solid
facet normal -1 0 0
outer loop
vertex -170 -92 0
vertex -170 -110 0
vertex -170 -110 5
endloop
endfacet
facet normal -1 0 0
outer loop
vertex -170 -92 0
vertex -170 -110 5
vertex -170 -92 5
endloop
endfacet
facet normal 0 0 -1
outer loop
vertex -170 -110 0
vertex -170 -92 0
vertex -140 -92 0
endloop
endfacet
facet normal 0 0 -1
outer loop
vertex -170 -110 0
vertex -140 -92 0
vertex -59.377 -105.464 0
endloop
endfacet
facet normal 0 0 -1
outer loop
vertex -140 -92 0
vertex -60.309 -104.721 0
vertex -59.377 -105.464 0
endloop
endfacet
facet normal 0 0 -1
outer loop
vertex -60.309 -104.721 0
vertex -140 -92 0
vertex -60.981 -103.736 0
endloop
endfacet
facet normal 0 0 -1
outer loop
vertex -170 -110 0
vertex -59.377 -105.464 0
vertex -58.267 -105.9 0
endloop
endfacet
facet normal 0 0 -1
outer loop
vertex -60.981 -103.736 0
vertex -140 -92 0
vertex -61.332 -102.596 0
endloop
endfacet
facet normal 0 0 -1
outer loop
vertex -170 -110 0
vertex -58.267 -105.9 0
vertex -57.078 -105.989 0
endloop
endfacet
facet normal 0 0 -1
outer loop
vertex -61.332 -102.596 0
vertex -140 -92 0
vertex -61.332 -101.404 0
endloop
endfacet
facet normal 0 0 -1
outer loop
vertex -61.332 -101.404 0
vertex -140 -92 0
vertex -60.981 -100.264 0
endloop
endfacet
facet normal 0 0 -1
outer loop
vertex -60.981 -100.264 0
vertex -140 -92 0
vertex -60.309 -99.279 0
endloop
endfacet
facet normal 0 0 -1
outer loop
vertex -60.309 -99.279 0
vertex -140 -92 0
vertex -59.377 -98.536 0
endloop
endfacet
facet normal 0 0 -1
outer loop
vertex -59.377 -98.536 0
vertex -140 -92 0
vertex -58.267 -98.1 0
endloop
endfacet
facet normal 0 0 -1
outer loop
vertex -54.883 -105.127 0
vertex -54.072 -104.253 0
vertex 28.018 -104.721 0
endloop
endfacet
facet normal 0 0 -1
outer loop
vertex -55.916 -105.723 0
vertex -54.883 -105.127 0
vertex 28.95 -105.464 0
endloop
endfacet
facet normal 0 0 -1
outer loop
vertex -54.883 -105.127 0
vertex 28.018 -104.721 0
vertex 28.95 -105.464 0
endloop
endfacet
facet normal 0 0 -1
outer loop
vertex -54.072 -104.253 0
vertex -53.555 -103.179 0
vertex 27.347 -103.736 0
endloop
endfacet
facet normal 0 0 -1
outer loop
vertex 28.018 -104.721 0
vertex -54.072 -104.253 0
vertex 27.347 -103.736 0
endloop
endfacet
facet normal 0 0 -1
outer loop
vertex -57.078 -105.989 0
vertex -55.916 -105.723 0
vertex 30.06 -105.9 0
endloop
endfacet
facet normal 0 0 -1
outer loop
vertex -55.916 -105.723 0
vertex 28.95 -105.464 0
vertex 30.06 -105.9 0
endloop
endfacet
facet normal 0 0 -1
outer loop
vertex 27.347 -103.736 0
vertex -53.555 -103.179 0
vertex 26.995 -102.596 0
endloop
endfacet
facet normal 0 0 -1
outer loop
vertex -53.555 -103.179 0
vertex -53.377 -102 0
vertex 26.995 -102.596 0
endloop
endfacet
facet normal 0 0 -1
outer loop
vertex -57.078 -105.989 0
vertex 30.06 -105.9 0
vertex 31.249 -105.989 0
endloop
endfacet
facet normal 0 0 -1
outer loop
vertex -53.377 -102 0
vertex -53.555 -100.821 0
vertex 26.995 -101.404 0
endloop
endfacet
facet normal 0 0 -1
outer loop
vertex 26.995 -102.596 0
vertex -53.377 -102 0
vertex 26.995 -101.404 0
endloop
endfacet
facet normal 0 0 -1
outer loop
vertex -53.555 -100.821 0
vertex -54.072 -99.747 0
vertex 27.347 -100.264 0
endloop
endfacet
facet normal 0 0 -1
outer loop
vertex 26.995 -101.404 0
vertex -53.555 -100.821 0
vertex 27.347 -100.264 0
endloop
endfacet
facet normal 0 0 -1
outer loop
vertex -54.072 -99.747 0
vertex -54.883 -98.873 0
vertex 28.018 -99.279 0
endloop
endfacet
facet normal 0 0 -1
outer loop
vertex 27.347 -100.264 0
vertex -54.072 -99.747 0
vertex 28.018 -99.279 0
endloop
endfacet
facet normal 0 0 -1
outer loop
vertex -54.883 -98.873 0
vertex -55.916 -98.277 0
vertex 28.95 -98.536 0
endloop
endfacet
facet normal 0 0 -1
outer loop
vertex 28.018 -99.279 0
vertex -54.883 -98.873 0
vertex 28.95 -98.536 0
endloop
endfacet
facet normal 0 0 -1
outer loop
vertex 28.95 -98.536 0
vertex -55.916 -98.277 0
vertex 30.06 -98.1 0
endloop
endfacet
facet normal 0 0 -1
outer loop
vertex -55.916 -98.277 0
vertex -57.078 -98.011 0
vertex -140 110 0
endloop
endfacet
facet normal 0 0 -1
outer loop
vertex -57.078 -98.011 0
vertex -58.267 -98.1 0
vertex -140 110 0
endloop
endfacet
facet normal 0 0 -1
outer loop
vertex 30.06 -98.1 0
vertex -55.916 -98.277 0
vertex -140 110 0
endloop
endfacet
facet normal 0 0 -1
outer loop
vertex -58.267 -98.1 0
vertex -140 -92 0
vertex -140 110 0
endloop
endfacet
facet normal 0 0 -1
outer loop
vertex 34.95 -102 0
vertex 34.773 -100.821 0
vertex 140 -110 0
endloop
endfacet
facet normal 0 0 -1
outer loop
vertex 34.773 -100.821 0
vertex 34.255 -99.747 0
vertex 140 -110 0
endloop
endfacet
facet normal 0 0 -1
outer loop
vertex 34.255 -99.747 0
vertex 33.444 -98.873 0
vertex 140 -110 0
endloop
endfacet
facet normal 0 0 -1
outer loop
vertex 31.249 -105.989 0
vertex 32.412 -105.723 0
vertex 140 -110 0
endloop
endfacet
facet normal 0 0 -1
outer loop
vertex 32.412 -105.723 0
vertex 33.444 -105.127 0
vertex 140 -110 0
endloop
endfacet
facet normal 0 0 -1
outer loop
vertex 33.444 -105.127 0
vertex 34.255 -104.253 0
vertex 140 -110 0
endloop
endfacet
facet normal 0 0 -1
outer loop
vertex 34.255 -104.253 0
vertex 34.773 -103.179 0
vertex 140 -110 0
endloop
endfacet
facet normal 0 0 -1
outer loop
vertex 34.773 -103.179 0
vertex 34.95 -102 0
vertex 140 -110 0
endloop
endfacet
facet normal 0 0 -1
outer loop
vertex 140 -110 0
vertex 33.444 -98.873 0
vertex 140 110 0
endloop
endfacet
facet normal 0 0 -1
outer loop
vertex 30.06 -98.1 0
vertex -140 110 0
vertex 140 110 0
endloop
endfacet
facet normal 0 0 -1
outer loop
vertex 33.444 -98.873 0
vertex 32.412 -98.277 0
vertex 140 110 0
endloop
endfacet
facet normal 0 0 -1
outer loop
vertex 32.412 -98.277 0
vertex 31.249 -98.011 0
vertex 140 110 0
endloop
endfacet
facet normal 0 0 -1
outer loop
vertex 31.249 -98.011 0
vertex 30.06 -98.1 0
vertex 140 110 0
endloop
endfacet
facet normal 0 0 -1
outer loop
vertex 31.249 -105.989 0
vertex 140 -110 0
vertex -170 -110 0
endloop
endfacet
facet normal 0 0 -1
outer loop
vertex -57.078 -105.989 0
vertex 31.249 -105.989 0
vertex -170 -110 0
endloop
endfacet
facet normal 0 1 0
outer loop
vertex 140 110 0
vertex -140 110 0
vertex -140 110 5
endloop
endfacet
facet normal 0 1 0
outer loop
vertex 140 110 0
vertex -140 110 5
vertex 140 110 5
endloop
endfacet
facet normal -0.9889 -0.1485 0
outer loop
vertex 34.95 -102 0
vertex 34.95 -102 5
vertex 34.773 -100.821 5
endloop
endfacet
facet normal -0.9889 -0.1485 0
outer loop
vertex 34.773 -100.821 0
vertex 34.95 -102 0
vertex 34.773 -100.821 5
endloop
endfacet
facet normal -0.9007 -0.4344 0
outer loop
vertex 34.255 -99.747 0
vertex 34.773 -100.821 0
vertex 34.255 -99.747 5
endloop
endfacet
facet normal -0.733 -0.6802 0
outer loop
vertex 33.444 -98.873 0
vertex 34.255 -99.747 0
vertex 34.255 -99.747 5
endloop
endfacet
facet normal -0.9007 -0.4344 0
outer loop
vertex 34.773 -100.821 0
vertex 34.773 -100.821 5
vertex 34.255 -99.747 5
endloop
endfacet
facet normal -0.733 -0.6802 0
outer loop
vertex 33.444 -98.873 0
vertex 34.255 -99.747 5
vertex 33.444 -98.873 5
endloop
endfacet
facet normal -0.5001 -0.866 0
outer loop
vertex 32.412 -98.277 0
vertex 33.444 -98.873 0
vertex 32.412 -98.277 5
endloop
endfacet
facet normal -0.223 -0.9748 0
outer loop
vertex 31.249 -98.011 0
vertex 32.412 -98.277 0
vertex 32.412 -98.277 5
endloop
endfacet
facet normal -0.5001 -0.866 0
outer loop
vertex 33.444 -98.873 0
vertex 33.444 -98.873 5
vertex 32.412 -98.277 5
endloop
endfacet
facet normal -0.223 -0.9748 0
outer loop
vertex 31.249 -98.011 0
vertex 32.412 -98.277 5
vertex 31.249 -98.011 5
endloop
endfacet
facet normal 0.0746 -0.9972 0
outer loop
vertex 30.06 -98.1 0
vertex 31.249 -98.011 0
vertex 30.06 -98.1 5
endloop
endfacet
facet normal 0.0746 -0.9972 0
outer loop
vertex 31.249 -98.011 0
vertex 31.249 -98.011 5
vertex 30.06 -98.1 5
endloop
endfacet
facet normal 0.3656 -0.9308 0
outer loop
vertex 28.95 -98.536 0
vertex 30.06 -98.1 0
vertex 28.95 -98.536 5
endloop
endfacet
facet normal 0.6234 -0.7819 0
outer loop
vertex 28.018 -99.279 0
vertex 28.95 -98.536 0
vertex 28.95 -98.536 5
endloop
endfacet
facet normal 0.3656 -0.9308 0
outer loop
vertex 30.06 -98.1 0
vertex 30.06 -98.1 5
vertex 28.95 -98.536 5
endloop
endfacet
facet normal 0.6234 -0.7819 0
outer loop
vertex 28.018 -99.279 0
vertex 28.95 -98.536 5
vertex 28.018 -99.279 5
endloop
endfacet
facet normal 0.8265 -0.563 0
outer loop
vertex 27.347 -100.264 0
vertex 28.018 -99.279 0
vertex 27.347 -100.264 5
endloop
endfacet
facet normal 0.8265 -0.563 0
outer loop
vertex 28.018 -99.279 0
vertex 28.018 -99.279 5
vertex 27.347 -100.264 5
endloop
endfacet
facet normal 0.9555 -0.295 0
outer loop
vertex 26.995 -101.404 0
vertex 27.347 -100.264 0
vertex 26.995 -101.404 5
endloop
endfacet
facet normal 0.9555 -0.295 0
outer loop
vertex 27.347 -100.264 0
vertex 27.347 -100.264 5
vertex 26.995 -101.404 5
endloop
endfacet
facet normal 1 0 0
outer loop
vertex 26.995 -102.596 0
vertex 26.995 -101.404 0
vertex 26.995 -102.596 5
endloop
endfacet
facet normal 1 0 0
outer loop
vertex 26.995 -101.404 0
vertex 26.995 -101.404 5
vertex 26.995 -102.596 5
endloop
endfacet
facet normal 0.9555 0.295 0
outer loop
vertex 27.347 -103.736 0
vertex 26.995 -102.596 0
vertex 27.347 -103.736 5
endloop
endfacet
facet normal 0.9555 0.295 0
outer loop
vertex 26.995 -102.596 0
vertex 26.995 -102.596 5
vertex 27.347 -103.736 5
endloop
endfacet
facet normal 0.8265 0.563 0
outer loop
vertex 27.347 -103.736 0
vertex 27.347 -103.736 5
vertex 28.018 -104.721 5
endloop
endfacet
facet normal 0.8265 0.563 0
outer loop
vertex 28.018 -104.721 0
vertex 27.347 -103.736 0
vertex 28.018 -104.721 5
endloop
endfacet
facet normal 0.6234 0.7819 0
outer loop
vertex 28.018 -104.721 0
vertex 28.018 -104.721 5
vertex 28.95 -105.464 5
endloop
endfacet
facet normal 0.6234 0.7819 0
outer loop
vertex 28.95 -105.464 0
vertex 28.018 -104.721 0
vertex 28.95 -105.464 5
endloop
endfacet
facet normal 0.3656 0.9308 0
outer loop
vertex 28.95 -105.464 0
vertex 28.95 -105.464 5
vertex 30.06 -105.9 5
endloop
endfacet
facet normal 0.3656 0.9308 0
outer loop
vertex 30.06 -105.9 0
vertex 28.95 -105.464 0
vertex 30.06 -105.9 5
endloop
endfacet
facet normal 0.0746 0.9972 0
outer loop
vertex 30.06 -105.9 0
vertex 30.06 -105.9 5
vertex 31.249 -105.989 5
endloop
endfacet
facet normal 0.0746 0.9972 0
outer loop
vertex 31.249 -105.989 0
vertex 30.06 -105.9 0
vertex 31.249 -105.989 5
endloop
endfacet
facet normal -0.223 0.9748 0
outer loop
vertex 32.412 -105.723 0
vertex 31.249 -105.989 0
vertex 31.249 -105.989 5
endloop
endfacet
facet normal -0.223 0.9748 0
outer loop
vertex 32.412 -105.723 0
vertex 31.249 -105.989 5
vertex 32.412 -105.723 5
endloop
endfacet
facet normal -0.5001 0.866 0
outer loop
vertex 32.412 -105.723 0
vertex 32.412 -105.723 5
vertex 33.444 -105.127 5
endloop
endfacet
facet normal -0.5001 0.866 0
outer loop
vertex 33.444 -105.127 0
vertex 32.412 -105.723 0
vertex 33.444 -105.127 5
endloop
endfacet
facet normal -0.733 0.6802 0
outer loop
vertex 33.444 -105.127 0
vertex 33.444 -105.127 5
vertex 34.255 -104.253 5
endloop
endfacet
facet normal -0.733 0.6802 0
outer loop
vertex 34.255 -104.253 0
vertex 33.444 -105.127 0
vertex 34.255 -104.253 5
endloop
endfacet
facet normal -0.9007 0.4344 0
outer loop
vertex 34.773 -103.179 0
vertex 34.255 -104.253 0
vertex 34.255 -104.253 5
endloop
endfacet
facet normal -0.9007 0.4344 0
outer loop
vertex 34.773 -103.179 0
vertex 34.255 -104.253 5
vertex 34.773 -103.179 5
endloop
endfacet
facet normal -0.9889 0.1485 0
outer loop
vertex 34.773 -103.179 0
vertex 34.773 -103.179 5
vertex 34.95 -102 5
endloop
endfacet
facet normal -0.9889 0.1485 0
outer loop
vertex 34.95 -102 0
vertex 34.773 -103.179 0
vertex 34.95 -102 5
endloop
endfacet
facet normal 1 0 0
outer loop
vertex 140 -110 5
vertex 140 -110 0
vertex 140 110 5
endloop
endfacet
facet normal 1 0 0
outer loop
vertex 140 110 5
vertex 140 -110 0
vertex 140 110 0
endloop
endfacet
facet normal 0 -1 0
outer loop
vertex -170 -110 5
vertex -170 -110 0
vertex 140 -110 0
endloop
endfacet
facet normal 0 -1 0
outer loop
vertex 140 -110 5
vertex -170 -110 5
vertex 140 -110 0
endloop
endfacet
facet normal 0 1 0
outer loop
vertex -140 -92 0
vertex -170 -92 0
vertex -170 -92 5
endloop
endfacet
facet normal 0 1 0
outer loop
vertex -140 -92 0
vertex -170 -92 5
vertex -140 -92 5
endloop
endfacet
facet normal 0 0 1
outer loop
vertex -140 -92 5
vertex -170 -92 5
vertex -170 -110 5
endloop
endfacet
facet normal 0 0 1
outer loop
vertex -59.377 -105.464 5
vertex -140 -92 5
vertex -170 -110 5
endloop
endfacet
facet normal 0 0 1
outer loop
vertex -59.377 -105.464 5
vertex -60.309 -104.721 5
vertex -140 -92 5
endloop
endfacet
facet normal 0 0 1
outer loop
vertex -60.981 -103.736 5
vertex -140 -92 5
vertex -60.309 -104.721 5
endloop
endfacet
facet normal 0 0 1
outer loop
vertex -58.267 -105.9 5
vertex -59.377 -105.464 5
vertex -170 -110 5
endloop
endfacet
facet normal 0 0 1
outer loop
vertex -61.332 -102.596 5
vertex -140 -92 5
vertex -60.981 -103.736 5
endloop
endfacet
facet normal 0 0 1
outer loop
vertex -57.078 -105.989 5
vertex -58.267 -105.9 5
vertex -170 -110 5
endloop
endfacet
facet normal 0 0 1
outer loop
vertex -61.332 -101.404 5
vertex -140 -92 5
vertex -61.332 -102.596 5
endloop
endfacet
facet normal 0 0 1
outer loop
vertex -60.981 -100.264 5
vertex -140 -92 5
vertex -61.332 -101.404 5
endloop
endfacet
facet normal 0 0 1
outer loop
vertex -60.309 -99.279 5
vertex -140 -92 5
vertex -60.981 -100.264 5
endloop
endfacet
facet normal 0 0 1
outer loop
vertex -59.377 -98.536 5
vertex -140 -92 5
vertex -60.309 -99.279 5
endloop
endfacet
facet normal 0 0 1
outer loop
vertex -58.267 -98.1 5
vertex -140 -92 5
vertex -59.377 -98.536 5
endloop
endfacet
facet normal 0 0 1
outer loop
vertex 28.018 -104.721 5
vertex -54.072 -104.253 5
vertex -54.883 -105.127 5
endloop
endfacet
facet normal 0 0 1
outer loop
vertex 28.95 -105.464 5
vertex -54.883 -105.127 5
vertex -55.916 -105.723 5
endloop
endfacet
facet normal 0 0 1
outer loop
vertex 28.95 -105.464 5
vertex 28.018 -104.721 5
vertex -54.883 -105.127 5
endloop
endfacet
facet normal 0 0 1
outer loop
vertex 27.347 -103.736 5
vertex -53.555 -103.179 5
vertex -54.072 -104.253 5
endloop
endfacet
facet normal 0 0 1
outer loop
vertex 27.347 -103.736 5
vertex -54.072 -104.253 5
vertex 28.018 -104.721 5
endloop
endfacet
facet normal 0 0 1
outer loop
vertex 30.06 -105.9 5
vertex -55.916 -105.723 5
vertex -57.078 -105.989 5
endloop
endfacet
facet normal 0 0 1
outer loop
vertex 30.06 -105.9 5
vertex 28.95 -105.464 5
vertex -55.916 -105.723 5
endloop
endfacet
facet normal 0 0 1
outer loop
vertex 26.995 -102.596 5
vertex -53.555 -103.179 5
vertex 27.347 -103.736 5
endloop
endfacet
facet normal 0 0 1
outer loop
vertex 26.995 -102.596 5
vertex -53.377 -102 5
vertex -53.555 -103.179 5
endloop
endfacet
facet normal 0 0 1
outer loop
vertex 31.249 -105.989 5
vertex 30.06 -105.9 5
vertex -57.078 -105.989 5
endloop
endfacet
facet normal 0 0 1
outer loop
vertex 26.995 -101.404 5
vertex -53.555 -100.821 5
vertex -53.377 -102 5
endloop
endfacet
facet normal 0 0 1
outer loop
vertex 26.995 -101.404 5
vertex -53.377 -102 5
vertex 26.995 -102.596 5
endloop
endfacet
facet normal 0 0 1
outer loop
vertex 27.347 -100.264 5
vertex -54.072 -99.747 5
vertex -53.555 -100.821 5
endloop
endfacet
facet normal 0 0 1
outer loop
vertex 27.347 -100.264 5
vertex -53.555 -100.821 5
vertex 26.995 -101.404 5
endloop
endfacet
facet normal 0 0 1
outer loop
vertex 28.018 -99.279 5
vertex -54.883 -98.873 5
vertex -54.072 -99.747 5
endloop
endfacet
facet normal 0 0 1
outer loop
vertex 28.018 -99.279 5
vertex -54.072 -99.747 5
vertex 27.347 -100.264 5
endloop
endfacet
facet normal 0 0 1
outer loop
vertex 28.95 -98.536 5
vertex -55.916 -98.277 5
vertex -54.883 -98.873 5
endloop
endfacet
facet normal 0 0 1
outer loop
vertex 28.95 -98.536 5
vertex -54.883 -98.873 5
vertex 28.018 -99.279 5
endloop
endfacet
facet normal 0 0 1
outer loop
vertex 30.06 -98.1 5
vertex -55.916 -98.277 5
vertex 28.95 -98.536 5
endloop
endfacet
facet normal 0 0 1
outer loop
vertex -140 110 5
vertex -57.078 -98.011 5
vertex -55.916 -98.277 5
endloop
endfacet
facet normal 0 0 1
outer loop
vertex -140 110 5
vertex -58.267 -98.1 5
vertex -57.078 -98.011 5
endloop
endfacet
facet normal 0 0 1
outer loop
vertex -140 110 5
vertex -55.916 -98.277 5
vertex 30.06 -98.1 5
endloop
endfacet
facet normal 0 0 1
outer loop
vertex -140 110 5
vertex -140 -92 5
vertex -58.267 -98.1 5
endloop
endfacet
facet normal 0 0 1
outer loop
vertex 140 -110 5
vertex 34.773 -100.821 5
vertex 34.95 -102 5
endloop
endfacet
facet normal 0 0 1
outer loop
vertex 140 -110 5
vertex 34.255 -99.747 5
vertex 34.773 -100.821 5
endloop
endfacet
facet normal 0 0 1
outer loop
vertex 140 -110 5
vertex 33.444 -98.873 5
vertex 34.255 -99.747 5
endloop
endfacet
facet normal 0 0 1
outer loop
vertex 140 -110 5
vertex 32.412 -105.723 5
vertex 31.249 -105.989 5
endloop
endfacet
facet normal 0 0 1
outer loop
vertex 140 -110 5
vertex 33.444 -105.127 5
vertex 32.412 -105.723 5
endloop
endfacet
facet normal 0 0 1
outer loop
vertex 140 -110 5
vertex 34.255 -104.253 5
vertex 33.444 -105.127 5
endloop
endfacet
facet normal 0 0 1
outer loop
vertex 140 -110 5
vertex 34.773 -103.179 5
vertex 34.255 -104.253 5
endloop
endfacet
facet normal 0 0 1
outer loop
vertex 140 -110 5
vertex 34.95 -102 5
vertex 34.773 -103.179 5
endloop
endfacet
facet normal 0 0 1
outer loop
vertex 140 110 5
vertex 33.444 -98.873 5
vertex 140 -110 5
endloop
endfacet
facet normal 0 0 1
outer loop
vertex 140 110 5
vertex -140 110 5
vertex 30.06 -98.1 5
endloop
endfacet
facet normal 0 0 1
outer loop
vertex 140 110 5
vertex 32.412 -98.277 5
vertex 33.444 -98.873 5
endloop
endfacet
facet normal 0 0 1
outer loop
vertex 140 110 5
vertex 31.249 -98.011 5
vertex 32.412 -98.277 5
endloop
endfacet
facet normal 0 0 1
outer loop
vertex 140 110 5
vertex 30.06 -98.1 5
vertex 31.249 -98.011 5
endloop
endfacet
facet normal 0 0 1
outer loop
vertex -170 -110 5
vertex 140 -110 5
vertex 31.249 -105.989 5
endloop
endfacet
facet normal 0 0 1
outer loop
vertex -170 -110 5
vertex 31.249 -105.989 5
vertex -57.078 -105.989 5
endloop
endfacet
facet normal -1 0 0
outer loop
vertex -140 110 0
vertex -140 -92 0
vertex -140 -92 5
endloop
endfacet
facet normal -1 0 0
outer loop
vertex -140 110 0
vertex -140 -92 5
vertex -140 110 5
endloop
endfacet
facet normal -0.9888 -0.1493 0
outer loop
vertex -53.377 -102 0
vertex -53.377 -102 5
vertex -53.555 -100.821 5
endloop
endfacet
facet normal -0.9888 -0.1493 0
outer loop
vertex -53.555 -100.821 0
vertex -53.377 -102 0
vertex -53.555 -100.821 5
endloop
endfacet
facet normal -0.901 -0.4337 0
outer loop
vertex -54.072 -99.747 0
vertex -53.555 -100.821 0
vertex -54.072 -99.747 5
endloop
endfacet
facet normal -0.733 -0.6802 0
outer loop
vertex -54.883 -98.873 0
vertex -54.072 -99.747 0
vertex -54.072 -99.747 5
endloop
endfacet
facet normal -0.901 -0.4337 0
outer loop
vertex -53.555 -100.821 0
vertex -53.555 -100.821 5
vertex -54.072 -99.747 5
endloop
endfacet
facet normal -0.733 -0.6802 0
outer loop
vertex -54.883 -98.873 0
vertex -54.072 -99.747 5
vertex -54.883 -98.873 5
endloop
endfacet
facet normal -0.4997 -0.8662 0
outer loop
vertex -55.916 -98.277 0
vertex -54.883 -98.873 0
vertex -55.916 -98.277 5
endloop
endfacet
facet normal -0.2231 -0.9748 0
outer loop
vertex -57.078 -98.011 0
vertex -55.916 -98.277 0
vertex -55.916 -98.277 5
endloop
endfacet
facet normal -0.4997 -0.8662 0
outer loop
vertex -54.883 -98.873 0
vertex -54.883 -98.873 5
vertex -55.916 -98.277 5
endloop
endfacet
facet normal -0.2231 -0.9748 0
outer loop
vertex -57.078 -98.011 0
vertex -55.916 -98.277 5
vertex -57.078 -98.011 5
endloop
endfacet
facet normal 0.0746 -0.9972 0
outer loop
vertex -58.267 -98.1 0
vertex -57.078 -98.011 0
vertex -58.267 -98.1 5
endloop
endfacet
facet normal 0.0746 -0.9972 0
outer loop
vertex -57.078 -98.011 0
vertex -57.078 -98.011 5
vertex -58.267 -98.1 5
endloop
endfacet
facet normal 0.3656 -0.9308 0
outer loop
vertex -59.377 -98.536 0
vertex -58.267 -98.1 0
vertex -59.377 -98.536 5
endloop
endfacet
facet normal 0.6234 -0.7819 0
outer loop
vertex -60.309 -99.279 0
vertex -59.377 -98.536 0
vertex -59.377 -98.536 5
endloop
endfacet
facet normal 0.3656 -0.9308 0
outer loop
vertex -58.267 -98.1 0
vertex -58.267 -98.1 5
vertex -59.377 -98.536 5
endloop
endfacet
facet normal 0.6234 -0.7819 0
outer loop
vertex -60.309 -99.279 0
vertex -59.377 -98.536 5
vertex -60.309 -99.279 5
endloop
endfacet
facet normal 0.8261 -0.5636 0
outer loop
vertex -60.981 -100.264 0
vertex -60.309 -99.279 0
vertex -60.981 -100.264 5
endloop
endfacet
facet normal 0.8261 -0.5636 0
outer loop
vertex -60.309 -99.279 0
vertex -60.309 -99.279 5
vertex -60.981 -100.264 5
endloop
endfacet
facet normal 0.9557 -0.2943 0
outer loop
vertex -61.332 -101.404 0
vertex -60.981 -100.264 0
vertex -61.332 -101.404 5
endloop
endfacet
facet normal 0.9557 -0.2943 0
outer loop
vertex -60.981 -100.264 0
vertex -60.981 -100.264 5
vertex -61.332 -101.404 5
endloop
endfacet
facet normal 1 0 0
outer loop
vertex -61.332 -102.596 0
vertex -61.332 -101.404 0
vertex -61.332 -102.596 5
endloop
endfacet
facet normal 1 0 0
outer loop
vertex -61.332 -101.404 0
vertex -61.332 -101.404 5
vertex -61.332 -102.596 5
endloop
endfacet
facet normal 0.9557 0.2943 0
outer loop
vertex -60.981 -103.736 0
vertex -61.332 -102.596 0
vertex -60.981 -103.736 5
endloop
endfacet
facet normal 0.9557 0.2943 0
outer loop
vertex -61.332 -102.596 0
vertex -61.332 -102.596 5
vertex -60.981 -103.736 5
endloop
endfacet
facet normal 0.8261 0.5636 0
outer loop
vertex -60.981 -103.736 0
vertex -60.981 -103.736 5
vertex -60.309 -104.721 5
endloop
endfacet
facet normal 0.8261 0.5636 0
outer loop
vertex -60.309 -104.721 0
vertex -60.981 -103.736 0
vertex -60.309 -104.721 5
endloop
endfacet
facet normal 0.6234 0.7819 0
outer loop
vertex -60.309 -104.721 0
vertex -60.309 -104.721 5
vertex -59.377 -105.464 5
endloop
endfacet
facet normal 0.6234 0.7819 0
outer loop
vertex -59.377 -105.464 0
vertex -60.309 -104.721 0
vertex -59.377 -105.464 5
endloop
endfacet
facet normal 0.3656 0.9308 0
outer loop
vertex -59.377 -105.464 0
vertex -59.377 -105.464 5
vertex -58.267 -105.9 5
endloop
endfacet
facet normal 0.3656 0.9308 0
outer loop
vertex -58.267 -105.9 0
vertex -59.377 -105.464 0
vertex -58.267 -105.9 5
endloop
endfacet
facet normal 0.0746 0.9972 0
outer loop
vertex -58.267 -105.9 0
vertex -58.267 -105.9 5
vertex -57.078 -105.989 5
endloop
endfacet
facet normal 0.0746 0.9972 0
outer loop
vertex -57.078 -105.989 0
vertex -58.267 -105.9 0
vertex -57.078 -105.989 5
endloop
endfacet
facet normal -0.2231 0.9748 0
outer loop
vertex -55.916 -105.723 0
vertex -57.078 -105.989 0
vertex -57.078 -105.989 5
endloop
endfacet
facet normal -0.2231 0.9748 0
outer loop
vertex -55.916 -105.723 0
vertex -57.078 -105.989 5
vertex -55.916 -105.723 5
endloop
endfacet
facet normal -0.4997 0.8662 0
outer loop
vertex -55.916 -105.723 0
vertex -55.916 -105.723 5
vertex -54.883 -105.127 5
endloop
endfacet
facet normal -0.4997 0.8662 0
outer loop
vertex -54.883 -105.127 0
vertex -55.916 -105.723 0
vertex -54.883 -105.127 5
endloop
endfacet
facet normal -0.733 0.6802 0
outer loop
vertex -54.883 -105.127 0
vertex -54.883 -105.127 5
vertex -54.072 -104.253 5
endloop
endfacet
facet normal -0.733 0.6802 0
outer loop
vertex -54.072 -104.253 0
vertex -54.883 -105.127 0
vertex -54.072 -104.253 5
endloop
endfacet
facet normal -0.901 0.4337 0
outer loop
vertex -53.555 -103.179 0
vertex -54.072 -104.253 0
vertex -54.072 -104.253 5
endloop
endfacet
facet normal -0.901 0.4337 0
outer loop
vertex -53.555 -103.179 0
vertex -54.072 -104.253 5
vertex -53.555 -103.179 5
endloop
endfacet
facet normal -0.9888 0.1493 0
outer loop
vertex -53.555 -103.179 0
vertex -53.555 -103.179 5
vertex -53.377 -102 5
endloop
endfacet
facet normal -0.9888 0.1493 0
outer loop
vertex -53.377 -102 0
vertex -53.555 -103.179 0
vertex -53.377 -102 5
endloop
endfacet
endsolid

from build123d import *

# Parameters (mm, degrees)
SKETCH1_W           = 280
SKETCH1_H           = 220
SKETCH1_W_2         = 30
SKETCH1_H_2         = 18
BOSS_EXTRUDE1_DEPTH = 5
SKETCH2_R           = 4
CUT_EXTRUDE1_DEPTH  = 10


with BuildPart() as part:
    # Sketch1 → Boss-Extrude1 (new body)
    with BuildSketch(Plane.XY):
        Rectangle(SKETCH1_W, SKETCH1_H)
        with Locations((-155, -101)):
            Rectangle(SKETCH1_W_2, SKETCH1_H_2)
    extrude(amount=BOSS_EXTRUDE1_DEPTH)

    # Sketch2 → Cut-Extrude1 (cut)
    with BuildSketch(Plane.XY.offset(5)):
        with Locations((-57.377117084, -102)):
            Circle(SKETCH2_R)
        with Locations((30.950491695, -102)):
            Circle(SKETCH2_R)
    extrude(amount=-CUT_EXTRUDE1_DEPTH, mode=Mode.SUBTRACT)


solid = part.part
